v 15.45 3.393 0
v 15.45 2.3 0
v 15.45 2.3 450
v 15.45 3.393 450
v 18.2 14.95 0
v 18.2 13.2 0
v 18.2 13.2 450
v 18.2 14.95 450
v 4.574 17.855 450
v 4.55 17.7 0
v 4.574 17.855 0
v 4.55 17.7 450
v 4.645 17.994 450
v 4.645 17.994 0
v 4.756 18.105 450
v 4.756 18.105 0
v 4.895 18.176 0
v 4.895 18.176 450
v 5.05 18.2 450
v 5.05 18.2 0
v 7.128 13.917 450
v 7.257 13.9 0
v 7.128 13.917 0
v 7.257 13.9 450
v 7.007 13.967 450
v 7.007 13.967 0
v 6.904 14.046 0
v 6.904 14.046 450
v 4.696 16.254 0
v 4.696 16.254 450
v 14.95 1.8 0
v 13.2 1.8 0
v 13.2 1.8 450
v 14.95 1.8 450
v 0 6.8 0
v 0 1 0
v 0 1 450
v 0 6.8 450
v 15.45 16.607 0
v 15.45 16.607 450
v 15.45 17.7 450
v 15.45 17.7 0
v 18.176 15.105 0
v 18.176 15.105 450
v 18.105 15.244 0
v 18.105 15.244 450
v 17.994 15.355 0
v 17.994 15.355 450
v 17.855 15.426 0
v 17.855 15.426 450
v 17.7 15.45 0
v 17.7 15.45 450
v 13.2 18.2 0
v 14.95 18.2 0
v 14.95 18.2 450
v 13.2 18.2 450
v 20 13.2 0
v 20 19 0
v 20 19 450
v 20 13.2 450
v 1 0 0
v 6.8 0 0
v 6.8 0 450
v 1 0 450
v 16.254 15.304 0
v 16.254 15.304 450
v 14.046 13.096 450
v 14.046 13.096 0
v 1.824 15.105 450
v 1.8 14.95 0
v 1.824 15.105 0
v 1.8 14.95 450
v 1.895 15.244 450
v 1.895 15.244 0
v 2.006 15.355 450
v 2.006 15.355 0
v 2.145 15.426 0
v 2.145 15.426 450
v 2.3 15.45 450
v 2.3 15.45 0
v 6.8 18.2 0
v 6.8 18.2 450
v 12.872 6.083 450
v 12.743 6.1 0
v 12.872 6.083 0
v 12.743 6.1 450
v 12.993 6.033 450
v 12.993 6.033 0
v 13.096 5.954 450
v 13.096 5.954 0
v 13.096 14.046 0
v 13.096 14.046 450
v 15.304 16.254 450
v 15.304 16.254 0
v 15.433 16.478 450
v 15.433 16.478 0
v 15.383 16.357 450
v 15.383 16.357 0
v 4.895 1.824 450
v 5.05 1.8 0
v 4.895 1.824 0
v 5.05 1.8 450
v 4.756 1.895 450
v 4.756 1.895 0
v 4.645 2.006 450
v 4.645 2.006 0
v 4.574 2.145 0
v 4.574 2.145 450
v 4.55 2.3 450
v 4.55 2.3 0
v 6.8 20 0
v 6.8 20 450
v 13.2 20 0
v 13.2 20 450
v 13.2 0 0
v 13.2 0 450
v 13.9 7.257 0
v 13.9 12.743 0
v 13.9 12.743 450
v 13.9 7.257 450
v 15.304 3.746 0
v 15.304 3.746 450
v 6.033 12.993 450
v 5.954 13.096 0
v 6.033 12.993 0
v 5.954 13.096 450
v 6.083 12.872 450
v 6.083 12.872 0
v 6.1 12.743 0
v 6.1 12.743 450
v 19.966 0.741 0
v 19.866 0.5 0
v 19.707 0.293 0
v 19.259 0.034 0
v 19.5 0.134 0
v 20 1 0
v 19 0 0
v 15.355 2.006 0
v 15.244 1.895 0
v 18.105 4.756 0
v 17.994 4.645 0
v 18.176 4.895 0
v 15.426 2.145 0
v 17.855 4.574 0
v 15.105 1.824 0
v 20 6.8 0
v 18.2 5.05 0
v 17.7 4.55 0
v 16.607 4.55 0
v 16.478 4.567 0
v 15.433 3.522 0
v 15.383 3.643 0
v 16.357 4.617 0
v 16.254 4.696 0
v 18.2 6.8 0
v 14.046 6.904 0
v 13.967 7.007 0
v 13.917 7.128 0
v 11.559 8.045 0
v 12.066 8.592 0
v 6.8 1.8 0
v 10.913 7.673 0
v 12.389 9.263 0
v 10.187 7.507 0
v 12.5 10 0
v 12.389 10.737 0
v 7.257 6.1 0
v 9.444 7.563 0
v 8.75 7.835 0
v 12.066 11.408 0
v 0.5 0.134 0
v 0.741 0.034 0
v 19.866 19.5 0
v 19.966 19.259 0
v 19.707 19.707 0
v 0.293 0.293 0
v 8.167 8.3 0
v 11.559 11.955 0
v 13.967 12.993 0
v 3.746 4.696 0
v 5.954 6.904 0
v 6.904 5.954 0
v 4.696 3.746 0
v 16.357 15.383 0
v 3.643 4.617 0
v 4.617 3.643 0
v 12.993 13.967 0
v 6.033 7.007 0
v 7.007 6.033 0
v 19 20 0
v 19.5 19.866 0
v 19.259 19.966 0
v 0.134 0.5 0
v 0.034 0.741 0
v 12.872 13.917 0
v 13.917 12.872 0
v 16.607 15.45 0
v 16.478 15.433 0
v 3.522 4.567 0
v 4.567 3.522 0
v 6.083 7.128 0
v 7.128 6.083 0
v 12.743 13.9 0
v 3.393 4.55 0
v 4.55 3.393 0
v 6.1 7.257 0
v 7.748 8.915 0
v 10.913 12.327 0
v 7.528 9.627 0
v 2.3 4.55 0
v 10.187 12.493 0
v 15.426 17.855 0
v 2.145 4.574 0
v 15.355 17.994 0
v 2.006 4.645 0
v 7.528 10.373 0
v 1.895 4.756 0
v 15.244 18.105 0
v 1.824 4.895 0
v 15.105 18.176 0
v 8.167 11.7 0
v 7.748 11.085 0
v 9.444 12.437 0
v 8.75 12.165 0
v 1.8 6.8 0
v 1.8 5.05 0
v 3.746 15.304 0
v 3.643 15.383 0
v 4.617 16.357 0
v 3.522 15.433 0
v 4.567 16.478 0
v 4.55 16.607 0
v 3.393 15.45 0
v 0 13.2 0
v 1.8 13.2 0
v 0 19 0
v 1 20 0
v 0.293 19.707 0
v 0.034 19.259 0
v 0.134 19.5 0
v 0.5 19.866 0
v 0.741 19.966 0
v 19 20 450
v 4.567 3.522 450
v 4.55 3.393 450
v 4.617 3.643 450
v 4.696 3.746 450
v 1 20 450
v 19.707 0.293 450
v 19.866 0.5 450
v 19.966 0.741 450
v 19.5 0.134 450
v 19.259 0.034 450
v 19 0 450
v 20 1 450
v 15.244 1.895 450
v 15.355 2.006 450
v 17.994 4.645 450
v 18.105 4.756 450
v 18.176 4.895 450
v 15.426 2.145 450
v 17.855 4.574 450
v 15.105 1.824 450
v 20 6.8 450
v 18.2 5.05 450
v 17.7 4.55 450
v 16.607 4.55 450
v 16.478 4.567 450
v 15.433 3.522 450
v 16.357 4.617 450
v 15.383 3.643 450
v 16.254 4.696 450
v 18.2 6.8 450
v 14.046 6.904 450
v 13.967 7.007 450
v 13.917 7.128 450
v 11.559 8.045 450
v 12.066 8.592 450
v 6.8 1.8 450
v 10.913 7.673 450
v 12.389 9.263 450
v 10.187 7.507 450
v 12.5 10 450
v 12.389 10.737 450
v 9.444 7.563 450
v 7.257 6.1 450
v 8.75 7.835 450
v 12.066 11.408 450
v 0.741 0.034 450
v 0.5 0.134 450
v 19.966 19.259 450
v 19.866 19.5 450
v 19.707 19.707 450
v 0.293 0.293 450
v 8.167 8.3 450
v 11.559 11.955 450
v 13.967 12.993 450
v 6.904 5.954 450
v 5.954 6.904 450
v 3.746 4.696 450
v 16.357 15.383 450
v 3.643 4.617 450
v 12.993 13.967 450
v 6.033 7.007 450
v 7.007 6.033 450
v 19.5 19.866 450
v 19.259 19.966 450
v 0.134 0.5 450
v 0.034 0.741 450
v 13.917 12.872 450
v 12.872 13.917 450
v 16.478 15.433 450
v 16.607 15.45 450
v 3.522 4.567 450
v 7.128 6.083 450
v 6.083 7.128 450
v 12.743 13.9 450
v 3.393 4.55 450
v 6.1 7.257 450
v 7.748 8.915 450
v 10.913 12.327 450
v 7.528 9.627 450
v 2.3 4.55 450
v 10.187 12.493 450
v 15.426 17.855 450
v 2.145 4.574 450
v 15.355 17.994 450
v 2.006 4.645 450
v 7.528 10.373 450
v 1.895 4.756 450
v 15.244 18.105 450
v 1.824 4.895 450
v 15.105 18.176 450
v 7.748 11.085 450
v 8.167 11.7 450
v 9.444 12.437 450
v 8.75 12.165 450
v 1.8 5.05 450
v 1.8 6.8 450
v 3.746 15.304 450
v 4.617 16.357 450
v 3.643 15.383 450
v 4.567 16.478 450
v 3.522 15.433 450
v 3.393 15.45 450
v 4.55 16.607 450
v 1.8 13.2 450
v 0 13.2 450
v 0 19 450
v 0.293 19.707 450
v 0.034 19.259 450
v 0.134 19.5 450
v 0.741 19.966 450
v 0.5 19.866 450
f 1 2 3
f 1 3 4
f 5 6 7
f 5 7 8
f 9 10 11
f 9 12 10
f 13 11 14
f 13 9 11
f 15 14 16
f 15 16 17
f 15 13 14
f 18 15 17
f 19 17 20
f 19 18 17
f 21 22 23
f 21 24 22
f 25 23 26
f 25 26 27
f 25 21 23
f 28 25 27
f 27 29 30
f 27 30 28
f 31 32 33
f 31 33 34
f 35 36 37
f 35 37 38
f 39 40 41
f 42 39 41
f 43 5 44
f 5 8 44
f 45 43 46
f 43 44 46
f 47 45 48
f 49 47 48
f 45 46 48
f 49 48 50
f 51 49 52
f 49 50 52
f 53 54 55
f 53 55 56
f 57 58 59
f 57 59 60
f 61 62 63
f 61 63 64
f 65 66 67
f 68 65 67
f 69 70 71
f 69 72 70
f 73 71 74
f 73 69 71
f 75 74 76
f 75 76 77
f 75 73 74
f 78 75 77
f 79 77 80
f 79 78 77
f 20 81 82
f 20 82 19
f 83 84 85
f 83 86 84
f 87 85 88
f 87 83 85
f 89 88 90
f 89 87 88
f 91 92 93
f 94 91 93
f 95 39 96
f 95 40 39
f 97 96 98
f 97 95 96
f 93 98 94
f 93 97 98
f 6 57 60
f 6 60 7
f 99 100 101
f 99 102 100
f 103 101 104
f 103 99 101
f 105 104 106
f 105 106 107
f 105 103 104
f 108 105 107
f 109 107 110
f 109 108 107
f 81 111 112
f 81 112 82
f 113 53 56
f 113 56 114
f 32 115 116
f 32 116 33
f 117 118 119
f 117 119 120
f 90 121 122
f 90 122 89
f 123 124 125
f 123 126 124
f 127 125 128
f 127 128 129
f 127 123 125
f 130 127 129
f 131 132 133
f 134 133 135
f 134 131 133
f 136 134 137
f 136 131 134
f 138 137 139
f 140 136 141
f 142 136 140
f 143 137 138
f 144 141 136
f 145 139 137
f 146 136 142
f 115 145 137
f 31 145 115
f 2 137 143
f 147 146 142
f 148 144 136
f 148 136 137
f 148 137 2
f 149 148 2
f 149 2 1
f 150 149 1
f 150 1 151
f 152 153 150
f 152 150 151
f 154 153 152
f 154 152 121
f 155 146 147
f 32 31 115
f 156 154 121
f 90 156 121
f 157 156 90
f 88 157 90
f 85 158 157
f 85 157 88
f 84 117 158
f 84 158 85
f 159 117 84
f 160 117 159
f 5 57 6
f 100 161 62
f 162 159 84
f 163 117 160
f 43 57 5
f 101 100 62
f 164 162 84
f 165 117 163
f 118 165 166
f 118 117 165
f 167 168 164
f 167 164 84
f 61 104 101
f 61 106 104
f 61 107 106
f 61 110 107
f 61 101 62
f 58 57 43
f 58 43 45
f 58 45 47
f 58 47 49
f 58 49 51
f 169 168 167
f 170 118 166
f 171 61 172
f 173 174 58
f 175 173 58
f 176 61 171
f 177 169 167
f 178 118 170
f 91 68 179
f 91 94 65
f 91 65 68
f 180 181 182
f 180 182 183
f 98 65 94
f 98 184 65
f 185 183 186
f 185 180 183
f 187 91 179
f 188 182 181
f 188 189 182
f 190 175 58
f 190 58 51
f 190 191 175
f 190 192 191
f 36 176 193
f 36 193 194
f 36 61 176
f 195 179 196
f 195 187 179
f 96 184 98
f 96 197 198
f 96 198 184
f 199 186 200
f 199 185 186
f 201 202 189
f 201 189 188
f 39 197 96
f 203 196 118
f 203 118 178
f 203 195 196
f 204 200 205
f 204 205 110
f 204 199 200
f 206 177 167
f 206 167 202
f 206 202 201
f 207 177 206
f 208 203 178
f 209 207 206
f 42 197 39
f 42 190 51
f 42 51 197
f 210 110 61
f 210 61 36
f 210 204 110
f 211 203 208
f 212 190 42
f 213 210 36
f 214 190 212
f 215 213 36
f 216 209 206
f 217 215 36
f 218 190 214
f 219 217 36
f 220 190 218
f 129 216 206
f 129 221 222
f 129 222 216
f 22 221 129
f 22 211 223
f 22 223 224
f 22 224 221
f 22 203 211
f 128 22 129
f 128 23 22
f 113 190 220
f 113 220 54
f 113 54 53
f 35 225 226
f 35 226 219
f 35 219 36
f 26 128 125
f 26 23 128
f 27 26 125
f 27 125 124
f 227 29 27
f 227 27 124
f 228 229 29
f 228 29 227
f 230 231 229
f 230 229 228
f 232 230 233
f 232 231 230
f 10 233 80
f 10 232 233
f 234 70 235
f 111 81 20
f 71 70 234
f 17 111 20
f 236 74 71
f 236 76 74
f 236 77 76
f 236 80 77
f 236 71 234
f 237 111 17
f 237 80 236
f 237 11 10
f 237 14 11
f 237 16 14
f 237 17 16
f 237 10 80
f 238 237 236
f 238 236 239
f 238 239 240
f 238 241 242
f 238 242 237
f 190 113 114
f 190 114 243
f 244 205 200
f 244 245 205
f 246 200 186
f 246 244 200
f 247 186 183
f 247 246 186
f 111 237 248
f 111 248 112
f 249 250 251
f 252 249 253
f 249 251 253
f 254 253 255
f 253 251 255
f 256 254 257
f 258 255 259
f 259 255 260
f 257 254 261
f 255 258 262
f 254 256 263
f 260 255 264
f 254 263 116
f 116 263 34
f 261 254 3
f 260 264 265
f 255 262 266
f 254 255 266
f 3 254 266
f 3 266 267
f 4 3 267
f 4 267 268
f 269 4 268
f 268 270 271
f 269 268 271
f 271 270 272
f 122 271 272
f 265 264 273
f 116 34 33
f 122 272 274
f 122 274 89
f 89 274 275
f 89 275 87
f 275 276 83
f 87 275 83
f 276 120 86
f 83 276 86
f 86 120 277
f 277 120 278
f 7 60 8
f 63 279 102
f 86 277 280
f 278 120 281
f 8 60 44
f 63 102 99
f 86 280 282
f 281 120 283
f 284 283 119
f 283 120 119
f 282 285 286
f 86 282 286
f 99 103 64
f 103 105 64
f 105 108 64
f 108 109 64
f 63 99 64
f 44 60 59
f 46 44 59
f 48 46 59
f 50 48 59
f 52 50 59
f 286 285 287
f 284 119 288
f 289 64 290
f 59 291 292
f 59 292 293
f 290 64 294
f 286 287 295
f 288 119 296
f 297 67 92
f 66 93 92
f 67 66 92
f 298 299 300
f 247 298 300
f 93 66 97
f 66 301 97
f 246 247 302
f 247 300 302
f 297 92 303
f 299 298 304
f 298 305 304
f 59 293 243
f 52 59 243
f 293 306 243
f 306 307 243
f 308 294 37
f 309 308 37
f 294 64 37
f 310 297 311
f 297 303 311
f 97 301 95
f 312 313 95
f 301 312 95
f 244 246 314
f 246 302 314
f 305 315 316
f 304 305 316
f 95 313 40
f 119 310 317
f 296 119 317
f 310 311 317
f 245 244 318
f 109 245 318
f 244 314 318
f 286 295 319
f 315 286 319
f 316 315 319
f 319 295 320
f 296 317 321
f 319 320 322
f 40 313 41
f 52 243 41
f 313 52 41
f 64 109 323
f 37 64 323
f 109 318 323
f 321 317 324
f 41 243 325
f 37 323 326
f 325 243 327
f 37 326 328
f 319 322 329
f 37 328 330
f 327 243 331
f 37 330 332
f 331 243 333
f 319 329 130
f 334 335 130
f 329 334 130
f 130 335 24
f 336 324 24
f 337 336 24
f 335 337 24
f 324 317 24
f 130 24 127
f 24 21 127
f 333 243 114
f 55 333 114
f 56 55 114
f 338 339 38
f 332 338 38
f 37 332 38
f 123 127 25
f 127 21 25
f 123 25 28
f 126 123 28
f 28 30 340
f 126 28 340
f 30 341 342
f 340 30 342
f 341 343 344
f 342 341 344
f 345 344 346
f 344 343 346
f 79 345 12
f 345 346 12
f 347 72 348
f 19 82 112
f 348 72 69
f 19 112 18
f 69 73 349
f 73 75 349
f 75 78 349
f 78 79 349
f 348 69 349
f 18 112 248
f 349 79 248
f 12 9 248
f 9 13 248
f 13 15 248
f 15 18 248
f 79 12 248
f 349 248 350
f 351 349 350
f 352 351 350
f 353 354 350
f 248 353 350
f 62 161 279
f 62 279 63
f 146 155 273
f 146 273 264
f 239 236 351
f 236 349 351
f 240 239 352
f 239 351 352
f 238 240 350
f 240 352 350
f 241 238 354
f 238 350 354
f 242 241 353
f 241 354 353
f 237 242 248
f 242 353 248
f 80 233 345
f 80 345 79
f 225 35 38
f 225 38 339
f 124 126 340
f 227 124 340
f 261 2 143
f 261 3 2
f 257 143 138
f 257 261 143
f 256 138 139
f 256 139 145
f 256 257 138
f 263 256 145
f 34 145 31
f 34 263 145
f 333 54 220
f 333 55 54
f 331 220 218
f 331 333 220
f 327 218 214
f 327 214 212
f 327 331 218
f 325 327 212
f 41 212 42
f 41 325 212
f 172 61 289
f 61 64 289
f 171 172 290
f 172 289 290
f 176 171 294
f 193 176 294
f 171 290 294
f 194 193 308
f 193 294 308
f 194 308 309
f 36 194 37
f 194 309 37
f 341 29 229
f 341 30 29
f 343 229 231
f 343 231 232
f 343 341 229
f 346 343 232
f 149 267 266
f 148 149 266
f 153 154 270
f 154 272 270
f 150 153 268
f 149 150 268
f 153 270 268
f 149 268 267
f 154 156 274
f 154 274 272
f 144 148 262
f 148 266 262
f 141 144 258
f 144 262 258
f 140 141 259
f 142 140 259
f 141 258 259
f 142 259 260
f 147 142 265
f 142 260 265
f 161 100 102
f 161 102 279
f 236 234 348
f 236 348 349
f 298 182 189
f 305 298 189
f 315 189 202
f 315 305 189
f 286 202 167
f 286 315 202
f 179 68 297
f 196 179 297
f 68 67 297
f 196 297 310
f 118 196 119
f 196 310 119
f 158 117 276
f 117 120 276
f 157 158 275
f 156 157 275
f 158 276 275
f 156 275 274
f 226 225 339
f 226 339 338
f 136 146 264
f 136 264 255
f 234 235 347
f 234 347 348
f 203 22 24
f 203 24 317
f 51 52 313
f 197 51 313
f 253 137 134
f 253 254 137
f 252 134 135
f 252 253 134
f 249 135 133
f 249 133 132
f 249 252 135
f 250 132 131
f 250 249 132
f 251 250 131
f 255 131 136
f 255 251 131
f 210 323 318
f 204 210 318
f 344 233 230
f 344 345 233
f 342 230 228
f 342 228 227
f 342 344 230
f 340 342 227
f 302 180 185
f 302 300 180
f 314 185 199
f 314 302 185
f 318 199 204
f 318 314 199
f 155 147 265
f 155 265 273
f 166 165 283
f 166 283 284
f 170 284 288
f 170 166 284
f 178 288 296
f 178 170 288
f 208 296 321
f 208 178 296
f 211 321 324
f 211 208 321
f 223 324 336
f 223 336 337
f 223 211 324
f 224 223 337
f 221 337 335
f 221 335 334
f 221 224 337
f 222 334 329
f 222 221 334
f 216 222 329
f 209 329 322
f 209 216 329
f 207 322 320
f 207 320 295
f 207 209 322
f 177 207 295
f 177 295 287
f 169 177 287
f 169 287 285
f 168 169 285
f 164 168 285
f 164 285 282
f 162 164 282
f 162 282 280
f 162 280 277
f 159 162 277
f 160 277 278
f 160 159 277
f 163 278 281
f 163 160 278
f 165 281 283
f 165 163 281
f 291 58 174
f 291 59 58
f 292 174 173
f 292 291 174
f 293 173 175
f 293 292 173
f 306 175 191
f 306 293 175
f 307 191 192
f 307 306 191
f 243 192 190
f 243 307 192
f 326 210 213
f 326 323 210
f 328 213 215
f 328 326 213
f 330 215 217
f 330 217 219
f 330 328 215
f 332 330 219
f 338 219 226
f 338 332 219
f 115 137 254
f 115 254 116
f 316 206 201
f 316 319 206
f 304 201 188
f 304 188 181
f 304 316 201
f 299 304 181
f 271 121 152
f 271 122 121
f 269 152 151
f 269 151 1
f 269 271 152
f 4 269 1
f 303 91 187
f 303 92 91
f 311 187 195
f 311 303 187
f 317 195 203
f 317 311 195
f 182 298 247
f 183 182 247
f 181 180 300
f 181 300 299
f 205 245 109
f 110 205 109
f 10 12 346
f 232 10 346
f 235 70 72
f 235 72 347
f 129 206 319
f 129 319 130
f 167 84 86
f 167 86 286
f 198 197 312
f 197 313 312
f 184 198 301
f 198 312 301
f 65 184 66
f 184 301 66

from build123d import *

# Parameters (mm, degrees)
SKETCH1_R           = 2.5
BOSS_EXTRUDE1_DEPTH = 450
FILLET1_R           = 1
FILLET2_R           = 0.5
FILLET3_R           = 0.5
FILLET4_R           = 0.5
FILLET5_R           = 0.5


with BuildPart() as part:
    # Sketch1 → Boss-Extrude1 (new body)
    with BuildSketch(Plane.XY):
        Polygon((13.2, 0), (13.2, 1.8), (15.45, 1.8), (15.45, 3.6), (12.95, 6.1), (7.05, 6.1), (4.55, 3.6), (4.55, 1.8), (6.8, 1.8), (6.8, 0), (0, 0), (0, 6.8), (1.8, 6.8), (1.8, 4.55), (3.6, 4.55), (6.1, 7.05), (6.1, 12.95), (3.6, 15.45), (1.8, 15.45), (1.8, 13.2), (0, 13.2), (0, 20), (6.8, 20), (6.8, 18.2), (4.55, 18.2), (4.55, 16.4), (7.05, 13.9), (12.95, 13.9), (15.45, 16.4), (15.45, 18.2), (13.2, 18.2), (13.2, 20), (20, 20), (20, 13.2), (18.2, 13.2), (18.2, 15.45), (16.4, 15.45), (13.9, 12.95), (13.9, 7.05), (16.4, 4.55), (18.2, 4.55), (18.2, 6.8), (20, 6.8), (20, 0), align=None)
        with Locations((10, 10)):
            Circle(SKETCH1_R, mode=Mode.SUBTRACT)
    extrude(amount=BOSS_EXTRUDE1_DEPTH)

    # Fillet1
    fillet1_edges = [part.edges().sort_by_distance(p)[0] for p in [
        (0, 0, 225),
        (0, 20, 225),
        (20, 20, 225),
        (20, 0, 225),
    ]]
    fillet(fillet1_edges, radius=FILLET1_R)

    # Fillet2
    fillet2_edges = [part.edges().sort_by_distance(p)[0] for p in [
        (4.55, 18.2, 225),
        (4.55, 16.4, 225),
        (7.05, 13.9, 225),
        (12.95, 13.9, 225),
        (15.45, 16.4, 225),
        (15.45, 18.2, 225),
    ]]
    fillet(fillet2_edges, radius=FILLET2_R)

    # Fillet3
    fillet3_edges = [part.edges().sort_by_distance(p)[0] for p in [
        (18.2, 15.45, 225),
        (16.4, 15.45, 225),
        (13.9, 12.95, 225),
        (13.9, 7.05, 225),
        (16.4, 4.55, 225),
        (18.2, 4.55, 225),
    ]]
    fillet(fillet3_edges, radius=FILLET3_R)

    # Fillet4
    fillet4_edges = [part.edges().sort_by_distance(p)[0] for p in [
        (1.8, 4.55, 225),
        (3.6, 4.55, 225),
        (6.1, 7.05, 225),
        (6.1, 12.95, 225),
        (3.6, 15.45, 225),
        (1.8, 15.45, 225),
    ]]
    fillet(fillet4_edges, radius=FILLET4_R)

    # Fillet5
    fillet5_edges = [part.edges().sort_by_distance(p)[0] for p in [
        (15.45, 1.8, 225),
        (15.45, 3.6, 225),
        (12.95, 6.1, 225),
        (7.05, 6.1, 225),
        (4.55, 3.6, 225),
        (4.55, 1.8, 225),
    ]]
    fillet(fillet5_edges, radius=FILLET5_R)


solid = part.part
